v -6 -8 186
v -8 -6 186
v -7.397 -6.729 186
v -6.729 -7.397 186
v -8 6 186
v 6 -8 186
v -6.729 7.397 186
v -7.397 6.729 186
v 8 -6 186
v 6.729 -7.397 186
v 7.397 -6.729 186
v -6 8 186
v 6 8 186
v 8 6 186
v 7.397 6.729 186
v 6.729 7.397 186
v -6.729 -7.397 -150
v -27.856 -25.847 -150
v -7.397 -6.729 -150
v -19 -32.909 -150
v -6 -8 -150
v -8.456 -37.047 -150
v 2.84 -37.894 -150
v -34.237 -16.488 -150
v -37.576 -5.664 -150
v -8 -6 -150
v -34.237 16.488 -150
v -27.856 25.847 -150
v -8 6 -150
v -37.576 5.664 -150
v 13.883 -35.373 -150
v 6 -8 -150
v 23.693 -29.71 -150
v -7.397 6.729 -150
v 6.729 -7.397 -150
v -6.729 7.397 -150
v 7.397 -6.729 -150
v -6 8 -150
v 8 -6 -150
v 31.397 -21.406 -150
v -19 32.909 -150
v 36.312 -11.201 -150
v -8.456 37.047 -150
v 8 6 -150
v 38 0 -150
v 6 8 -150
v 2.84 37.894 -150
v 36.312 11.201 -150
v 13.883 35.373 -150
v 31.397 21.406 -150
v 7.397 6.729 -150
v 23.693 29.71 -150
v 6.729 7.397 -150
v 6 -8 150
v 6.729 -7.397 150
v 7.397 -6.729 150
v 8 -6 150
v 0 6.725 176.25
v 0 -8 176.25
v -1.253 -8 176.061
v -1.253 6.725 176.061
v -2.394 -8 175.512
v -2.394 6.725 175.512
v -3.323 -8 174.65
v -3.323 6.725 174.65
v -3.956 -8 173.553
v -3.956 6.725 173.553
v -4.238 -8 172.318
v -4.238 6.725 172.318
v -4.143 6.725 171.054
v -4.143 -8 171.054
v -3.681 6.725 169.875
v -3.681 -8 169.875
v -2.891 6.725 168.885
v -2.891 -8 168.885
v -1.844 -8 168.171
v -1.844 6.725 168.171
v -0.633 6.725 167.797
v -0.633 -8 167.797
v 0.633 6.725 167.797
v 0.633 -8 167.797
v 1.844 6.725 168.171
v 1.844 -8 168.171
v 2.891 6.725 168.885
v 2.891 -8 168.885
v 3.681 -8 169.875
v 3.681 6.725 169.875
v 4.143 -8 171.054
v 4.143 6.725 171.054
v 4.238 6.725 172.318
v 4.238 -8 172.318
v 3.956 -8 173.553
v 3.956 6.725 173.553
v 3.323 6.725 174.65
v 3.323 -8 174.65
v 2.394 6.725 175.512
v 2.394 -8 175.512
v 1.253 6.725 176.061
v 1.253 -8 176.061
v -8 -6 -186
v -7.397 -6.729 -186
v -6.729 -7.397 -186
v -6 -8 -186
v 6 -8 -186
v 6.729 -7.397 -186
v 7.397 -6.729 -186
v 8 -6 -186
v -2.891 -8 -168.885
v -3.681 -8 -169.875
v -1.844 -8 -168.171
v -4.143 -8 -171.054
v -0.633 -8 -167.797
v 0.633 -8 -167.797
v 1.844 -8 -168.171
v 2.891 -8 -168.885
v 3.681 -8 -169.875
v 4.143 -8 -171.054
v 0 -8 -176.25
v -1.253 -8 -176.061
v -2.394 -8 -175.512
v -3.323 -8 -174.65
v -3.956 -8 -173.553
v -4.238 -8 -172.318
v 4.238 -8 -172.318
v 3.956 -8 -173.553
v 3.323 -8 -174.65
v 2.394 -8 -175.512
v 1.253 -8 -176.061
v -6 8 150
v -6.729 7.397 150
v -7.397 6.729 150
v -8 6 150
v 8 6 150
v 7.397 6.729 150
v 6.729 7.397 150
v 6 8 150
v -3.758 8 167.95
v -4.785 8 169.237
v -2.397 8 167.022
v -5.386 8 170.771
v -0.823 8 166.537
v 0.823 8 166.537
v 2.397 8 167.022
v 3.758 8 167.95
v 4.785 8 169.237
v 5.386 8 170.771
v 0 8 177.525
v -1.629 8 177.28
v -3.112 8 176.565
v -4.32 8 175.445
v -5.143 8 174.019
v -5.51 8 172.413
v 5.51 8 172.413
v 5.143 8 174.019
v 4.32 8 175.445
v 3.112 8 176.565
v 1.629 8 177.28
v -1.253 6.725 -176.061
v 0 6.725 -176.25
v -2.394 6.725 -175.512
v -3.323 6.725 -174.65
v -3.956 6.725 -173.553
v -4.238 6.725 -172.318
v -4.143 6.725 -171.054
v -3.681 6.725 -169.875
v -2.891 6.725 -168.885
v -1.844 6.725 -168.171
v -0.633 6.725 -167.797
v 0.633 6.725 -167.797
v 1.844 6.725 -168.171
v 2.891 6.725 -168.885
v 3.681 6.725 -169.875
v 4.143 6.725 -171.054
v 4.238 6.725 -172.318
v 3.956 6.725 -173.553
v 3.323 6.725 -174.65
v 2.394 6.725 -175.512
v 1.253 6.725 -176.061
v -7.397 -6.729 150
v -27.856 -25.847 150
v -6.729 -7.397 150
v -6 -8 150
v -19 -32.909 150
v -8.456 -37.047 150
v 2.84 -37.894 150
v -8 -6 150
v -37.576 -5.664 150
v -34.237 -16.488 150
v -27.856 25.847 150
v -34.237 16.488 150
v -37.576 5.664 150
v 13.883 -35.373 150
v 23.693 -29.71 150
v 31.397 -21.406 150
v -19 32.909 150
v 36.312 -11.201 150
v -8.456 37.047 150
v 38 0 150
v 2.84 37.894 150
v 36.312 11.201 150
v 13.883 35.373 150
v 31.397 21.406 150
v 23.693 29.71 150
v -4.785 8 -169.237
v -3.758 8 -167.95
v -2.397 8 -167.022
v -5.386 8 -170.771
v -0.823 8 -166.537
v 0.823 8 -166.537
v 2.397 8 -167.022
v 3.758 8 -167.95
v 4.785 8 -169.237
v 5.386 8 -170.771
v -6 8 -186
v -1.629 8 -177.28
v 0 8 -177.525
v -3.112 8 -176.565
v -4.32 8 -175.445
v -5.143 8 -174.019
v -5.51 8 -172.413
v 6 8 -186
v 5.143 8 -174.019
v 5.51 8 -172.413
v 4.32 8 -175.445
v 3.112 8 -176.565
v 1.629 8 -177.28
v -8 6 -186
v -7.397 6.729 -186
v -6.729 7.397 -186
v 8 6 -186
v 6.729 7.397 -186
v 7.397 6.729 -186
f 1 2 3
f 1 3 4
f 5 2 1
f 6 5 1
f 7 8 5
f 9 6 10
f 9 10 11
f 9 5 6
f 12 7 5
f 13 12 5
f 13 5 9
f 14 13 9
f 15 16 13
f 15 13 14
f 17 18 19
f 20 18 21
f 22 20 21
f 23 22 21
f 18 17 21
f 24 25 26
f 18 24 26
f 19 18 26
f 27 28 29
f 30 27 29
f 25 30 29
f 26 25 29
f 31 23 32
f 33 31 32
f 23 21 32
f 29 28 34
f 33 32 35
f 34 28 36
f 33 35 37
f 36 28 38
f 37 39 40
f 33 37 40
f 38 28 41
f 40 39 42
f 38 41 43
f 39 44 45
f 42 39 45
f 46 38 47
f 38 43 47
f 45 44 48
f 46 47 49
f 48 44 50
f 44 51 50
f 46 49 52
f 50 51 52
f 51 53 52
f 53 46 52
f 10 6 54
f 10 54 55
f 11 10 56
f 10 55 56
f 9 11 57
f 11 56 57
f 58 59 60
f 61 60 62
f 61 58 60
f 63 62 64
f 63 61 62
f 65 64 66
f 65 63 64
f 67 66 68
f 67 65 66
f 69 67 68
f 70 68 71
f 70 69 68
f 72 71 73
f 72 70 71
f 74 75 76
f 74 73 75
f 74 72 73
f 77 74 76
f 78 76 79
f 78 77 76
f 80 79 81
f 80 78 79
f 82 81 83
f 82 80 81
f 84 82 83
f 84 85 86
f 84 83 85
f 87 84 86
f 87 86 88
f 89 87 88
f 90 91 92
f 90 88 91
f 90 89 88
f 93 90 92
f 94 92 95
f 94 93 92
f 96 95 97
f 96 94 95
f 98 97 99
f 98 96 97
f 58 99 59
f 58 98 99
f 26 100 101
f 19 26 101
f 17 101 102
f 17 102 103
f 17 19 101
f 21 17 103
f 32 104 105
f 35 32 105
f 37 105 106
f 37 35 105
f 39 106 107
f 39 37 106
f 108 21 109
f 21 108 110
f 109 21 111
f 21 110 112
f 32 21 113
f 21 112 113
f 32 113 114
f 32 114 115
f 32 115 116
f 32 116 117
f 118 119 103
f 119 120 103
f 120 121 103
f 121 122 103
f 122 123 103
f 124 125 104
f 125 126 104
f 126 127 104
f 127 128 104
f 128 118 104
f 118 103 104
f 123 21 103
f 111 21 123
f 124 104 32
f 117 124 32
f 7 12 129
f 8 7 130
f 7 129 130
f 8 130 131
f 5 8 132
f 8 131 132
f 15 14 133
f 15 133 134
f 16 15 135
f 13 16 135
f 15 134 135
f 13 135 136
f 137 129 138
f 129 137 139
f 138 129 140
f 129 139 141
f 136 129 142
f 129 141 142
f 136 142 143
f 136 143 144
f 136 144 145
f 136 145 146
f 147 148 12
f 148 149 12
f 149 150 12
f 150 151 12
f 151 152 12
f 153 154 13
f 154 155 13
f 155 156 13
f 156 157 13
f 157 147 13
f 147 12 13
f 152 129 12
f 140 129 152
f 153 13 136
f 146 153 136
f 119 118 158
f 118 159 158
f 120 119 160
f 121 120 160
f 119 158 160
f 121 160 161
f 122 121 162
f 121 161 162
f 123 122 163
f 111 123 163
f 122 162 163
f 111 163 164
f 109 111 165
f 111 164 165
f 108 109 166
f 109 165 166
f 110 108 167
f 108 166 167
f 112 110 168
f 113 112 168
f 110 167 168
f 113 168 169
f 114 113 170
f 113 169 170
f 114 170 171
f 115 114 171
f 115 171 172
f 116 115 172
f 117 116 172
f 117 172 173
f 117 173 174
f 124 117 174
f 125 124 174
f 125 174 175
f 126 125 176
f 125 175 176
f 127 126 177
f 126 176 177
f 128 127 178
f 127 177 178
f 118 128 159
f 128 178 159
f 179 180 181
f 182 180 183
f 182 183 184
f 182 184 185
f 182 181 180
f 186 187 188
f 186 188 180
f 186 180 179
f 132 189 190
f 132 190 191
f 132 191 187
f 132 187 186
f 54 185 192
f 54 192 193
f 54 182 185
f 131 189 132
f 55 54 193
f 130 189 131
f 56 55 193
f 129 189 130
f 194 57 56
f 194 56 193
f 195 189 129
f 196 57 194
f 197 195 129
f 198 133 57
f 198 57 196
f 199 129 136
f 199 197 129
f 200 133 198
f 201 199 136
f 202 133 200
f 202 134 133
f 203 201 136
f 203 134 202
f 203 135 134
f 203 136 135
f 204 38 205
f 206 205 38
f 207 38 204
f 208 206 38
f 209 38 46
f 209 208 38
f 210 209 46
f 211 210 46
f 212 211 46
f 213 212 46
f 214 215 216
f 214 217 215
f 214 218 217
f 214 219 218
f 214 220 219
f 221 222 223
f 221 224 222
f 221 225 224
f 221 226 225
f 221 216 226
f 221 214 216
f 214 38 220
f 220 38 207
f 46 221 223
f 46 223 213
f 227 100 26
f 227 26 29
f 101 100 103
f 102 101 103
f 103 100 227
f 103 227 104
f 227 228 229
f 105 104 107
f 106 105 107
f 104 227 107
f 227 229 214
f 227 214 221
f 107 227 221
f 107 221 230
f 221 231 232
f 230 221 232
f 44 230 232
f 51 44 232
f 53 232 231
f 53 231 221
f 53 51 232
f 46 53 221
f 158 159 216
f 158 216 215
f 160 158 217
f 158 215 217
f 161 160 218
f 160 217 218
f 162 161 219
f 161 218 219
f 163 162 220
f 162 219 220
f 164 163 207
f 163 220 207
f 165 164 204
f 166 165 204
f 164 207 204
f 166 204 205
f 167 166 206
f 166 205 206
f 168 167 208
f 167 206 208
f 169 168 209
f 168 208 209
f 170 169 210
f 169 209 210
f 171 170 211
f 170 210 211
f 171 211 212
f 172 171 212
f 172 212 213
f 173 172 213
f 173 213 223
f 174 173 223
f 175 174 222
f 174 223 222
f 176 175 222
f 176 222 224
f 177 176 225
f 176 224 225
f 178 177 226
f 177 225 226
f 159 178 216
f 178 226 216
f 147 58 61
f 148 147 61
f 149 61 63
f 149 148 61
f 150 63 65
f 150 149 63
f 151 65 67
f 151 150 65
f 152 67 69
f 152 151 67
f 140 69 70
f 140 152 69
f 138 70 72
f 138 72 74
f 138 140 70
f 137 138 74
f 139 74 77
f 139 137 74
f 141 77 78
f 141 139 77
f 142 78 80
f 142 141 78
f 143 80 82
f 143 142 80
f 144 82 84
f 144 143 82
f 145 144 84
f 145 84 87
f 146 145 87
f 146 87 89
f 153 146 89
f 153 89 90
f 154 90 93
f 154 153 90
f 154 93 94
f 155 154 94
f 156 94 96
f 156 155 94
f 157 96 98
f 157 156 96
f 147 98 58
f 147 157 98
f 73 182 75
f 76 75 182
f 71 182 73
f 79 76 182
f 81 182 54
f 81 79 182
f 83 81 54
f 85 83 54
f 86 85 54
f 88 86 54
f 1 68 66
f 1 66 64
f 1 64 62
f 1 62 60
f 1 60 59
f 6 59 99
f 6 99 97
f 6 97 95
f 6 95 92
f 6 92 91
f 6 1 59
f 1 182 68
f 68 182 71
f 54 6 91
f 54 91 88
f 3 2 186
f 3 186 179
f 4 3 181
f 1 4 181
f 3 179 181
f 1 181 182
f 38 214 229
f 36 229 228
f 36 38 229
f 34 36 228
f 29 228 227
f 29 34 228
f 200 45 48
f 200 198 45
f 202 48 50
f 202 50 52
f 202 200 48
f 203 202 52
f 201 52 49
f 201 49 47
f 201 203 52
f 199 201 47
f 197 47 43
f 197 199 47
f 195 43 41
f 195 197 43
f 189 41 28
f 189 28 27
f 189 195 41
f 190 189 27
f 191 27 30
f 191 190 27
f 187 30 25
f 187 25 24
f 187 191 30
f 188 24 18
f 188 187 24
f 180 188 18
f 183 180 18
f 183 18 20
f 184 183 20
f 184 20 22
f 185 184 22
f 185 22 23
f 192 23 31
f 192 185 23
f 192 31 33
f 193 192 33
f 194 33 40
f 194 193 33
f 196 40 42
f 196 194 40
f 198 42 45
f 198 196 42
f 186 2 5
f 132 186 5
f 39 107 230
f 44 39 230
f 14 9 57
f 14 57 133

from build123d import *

# Parameters (mm, degrees)
SKETCH_1_R           = 38
EXTRUDE_1_DEPTH      = 150
SKETCH_2_R           = 10
EXTRUDE_2_DEPTH      = 36
SKETCH_3_OUTSIDE_W   = 148.554
SKETCH_3_OUTSIDE_H   = 148.554
SKETCH_3_OUTSIDE_W_2 = 16
SKETCH_3_OUTSIDE_H_2 = 16
CUT_EXTRUDE_1_DEPTH  = 36


with BuildPart() as part:
    # 草图1 → 凸台-拉伸1 (new, symmetric)
    with BuildSketch(Plane.XY):
        Circle(SKETCH_1_R)
    extrude(amount=EXTRUDE_1_DEPTH, both=True)

    # 草图2 → 凸台-拉伸2 (add)
    with BuildSketch(Plane.XY.offset(150)):
        Circle(SKETCH_2_R)
    extrude_2 = extrude(amount=EXTRUDE_2_DEPTH)

    # 草图3 outside → 切除-拉伸1 (cut)
    with BuildSketch(Plane.XY.offset(186)):
        Rectangle(SKETCH_3_OUTSIDE_W, SKETCH_3_OUTSIDE_H)
        Rectangle(SKETCH_3_OUTSIDE_W_2, SKETCH_3_OUTSIDE_H_2, mode=Mode.SUBTRACT)
    cut_extrude_1 = extrude(amount=-CUT_EXTRUDE_1_DEPTH, mode=Mode.SUBTRACT)

    # 草图5 → M10 螺纹孔1 (revolve, cut)
    with BuildSketch(Plane(origin=(0, 8, 172), x_dir=(0, 0, 1), z_dir=(1, 0, 0))):
        Polygon((0, 0), (0, 27.053657631), (4.25, 24.5), (4.25, 1.275), (5.525, 0), align=None)
    hole_wizard_m10_1 = revolve(axis=Axis((0, 14.35, 172), (0, -1, 0)), mode=Mode.SUBTRACT)

    # 镜向1: 凸台-拉伸2, 切除-拉伸1, M10 螺纹孔1 across plane
    add(extrude_2.mirror(Plane.XY))
    add(cut_extrude_1.mirror(Plane.XY), mode=Mode.SUBTRACT)
    add(hole_wizard_m10_1.mirror(Plane.XY), mode=Mode.SUBTRACT)


solid = part.part
